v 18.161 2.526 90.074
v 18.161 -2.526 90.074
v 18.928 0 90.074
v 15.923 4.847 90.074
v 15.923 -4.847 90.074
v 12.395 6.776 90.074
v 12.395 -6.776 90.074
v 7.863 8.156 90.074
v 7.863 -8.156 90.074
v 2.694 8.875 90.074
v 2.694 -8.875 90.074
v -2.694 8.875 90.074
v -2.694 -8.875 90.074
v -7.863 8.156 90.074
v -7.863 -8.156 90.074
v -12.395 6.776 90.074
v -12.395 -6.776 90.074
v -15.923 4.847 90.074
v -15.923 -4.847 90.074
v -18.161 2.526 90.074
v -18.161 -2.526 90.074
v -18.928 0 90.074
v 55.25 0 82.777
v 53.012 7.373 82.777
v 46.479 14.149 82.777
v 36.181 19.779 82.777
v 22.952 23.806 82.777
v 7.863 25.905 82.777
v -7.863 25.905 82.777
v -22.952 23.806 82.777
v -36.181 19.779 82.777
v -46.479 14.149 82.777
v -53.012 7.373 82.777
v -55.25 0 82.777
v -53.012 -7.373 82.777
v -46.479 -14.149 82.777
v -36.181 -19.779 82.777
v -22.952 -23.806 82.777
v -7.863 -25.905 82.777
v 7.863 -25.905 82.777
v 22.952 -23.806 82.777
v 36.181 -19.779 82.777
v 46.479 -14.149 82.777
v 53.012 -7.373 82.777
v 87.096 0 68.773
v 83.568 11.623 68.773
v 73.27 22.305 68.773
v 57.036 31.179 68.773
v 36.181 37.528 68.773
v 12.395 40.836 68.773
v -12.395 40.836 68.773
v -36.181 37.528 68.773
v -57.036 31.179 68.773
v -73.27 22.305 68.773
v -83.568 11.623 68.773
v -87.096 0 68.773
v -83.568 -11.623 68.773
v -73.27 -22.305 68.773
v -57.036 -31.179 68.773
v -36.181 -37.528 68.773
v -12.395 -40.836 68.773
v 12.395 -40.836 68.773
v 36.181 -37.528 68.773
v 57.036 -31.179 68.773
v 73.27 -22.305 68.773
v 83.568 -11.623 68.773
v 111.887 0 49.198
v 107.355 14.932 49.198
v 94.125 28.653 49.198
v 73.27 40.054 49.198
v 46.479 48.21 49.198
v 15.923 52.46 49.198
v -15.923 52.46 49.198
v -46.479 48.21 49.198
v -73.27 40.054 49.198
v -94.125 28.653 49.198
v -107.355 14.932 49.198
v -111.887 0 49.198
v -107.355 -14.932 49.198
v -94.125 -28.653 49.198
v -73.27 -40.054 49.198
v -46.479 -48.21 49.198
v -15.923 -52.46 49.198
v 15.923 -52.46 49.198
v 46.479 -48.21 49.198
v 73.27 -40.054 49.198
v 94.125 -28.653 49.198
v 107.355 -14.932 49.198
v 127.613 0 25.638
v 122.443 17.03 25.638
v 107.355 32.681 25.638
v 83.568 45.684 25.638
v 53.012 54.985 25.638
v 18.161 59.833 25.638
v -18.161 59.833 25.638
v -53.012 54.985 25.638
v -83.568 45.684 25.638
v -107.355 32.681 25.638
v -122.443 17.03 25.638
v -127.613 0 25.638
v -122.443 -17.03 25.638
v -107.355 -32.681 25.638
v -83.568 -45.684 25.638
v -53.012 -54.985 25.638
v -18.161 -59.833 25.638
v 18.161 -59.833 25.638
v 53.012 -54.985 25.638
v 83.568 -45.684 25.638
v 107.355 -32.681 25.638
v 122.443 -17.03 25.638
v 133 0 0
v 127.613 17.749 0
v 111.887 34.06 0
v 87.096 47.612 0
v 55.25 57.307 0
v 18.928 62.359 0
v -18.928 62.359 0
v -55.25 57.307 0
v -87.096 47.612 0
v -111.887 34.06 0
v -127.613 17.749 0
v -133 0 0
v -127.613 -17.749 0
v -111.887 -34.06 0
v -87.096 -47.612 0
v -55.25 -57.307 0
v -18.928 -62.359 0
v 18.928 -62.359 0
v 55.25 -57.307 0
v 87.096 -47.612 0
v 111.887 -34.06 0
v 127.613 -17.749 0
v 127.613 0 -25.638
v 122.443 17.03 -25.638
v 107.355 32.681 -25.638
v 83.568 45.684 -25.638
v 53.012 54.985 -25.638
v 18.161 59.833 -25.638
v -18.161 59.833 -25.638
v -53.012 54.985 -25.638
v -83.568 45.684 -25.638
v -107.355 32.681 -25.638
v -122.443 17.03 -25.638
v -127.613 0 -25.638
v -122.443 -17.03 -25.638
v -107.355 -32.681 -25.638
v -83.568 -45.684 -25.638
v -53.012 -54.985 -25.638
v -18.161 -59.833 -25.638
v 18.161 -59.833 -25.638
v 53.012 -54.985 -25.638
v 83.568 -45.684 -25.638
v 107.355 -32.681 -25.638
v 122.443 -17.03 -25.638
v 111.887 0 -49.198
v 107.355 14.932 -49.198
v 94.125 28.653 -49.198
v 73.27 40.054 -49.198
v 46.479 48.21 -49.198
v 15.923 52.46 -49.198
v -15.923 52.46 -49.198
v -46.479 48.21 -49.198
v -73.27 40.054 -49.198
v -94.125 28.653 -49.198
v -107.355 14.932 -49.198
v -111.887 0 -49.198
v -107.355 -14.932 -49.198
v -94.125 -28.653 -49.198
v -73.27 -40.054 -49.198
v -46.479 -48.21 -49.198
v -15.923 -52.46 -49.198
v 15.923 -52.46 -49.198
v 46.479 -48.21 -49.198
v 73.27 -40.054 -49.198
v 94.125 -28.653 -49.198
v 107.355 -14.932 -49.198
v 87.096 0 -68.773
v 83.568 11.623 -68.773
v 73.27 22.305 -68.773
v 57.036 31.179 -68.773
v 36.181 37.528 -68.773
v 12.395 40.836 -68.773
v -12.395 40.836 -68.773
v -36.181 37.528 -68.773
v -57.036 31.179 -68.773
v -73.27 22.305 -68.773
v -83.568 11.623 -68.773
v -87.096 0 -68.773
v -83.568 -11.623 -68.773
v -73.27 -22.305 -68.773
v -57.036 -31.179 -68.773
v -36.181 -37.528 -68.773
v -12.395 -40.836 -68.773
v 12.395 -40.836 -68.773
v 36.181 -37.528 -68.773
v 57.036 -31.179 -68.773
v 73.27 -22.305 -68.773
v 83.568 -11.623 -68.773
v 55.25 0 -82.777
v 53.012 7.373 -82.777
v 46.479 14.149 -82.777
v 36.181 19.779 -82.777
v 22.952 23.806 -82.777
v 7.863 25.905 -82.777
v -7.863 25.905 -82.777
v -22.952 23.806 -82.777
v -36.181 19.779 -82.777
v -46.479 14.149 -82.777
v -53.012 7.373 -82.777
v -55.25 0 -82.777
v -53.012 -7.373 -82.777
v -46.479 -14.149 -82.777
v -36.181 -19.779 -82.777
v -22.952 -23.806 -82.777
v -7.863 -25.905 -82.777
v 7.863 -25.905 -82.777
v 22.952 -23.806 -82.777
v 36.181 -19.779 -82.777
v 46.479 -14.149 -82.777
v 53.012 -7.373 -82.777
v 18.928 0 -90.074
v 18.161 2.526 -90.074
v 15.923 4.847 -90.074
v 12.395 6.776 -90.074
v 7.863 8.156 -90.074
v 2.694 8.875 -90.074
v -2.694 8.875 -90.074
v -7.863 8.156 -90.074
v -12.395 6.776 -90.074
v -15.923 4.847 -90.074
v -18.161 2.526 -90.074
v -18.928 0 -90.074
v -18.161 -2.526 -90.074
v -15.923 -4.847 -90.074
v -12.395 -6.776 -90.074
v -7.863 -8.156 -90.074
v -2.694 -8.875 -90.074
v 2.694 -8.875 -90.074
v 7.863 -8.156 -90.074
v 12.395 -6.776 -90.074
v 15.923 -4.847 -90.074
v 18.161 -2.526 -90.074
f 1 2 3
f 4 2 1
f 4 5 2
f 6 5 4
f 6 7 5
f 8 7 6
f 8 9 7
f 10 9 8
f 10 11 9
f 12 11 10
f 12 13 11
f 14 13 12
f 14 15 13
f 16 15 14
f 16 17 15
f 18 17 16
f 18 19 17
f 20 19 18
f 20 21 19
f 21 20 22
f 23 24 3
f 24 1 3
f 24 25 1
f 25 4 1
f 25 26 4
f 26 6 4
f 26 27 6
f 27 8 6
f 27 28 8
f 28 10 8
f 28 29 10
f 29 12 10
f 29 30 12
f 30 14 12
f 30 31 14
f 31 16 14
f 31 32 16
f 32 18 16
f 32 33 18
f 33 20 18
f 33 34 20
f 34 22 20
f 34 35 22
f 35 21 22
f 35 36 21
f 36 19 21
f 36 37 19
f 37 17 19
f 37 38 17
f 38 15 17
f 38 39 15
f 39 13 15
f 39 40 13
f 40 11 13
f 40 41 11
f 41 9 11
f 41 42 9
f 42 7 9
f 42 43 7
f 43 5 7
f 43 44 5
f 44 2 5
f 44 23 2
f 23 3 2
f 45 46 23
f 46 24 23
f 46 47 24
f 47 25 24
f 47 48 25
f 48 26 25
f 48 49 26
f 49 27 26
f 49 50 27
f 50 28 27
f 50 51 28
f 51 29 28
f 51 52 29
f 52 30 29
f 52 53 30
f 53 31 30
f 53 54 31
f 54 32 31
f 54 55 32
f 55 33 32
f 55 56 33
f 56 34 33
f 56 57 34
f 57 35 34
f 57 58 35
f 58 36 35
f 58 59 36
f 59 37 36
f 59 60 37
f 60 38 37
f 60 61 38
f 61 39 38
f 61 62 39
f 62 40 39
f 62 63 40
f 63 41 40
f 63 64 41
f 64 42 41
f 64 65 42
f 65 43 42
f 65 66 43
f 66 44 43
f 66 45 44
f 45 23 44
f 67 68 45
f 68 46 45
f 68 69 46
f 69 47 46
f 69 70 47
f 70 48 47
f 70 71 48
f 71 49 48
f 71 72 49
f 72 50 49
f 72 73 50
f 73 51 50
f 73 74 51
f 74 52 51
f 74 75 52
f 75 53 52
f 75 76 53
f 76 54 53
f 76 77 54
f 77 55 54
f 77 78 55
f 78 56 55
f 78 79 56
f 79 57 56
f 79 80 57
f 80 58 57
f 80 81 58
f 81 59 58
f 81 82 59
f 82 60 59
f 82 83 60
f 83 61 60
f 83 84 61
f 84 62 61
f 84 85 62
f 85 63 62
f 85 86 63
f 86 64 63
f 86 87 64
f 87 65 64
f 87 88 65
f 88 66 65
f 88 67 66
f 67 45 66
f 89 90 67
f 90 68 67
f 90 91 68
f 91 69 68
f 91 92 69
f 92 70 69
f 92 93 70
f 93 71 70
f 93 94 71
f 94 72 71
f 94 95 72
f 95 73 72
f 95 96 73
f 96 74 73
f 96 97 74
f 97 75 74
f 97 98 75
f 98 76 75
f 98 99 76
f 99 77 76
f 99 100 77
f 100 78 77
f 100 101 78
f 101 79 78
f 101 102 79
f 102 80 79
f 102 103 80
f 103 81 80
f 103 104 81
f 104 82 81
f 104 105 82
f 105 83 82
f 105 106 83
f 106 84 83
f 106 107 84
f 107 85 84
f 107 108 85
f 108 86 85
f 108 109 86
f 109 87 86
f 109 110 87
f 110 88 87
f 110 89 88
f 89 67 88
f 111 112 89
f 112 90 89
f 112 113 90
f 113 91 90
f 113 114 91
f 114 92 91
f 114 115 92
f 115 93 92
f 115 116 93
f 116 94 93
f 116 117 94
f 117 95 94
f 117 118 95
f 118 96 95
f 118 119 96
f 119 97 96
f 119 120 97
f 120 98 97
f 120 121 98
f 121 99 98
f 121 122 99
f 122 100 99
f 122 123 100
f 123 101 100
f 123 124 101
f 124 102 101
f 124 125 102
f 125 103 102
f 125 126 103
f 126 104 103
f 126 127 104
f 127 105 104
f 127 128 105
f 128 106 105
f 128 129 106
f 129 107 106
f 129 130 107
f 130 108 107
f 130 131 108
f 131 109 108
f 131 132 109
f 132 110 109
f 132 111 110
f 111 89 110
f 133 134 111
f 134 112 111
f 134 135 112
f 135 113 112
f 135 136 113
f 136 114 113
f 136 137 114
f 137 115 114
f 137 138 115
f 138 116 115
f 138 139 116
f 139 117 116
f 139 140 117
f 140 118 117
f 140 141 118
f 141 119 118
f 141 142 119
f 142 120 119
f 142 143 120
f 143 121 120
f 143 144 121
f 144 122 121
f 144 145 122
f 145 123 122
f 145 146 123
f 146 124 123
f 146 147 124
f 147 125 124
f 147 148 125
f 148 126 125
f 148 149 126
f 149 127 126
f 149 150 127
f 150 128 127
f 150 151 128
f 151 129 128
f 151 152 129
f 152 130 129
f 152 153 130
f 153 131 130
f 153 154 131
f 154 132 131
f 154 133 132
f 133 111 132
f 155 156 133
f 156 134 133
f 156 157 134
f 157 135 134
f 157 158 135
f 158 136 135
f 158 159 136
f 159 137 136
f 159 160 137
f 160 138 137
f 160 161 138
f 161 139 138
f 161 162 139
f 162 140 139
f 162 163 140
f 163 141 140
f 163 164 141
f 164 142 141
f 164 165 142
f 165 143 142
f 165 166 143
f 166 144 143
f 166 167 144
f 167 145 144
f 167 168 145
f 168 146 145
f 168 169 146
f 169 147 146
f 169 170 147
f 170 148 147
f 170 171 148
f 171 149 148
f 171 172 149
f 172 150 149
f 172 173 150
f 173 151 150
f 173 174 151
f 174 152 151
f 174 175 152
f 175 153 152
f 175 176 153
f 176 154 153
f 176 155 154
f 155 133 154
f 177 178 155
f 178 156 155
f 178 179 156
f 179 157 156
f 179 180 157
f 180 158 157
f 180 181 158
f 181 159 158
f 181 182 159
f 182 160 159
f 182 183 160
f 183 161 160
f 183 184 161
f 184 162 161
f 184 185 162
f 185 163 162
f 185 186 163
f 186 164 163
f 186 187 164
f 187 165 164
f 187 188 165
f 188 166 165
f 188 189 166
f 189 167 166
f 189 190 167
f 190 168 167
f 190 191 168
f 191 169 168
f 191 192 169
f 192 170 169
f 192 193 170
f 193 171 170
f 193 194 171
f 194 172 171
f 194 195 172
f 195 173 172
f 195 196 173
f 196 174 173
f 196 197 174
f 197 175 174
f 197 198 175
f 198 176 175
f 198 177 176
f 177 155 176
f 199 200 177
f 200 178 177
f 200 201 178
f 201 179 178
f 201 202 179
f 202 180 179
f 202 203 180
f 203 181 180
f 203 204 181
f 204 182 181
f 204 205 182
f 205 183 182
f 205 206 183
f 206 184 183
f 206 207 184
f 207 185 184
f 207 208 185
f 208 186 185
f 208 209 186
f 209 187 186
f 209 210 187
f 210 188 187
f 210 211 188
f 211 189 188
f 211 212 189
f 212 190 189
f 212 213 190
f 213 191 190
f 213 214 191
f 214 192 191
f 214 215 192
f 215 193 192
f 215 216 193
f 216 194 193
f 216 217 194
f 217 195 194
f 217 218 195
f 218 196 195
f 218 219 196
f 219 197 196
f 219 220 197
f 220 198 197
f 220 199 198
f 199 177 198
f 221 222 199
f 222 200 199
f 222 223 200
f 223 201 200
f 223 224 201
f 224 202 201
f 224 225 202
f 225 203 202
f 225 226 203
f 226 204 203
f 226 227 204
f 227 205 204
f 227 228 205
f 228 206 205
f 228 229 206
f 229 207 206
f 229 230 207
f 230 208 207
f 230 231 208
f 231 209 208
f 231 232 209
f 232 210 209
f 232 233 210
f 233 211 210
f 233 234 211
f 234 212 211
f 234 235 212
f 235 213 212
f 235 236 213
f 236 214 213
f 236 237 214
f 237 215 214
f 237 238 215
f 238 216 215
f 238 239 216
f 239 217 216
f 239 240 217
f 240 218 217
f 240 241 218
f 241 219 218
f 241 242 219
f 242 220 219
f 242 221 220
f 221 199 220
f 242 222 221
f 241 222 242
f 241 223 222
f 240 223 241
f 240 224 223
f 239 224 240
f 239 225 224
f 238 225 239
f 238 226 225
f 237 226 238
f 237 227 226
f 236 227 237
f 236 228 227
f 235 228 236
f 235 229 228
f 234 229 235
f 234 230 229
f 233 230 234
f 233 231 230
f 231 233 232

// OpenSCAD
// Generated by SolidPython 1.0.1 on 2020-07-29 00:46:54


scale(v = [19, 9, 13]) {
	sphere(r = 7);
}
/***********************************************
*********      SolidPython code:      **********
************************************************
 
# import packages: SolidPython
from solid import *
from solid.utils import *
from itertools import chain, combinations, permutations


class Resize:

    def __init__(self, scad_file):
        self.scad_file = scad_file
        #self.scad_file = import_scad(scad_file)
        # cone/cylinder param:
        self.r1 = 0
        self.r2 = 0
        self.h = 0
        # rectangular prism param:
        self.w = 0
        self.l = 0
        # ellipse param:
        self.r = 0

    # import OpenScad code (file name corresponds to shape)


    # classify shape + parameters
    def assign(self, param1, param2, param3):
        if self.scad_file == 'cone.scad':
            self.r1 = param1
            self.r2 = param2
            self.h = param3
        elif self.scad_file == 'cylinder.scad':
            self.r1 = param1
            self.r2 = param2
            self.h = param3
        elif self.scad_file == 'rectangularPrism.scad':
            self.h = param1
            self.l = param2
            self.w = param3
        else:
            self.r = param1
            self.h = param2

    # resize parameters
    def iterate(self):
        x = range(3, 20, 2)
        i = 1
        if self.scad_file == 'cone.scad':
            tempList = list(permutations(x, 2))
            for temp in tempList:
                param1 = temp[0]
                param2 = temp[1]
                filepath = 'produced_scad_files/' + 'cone' + str(param1) + '_' + str(param2) + '_' + '.scad'
                scad_render_to_file(cylinder(h=param1, r1=param2, r2=0), filepath)

        elif self.scad_file == 'cylinder.scad':
            tempList = list(permutations(x, 3))
            for temp in tempList:
                param1 = temp[0]
                param2 = temp[1]
                filepath = 'produced_scad_files/' + 'cylinder' + str(param1) + '_' + str(param2) + '_' + '.scad'
                scad_render_to_file(cylinder(h=param1, r1=param2, r2=param2), filepath)

        elif self.scad_file == 'rectangularPrism.scad':
            tempList = list(permutations(x, 3))
            for temp in tempList:
                param1 = temp[0]
                param2 = temp[1]
                param3 = temp[2]
                filepath = 'produced_scad_files/' + 'rectangularPrism' + str(param1) + '_' + str(param2) + '_' + str(
                    param3) + '.scad'
                scad_render_to_file(cube(size=(param1, param2, param3)), filepath)

        elif self.scad_file == 'ellipse.scad':
            tempList = list(permutations(x, 4))
            for temp in tempList:
                param1 = temp[0]
                param2 = temp[1]
                param3 = temp[2]
                param4 = temp[3]
                filepath = 'produced_scad_files/' + 'ellipse' + str(param1) + '_' + str(param2) + '_' + str(param3) + '_' + str(param4) + '.scad'
                scad_render_to_file(scale([param1, param2, param3])(sphere(r=param4)), filepath)

    def render_to_scadfile(self):
        scad_render_to_file(scad, 'example.scad') 
 
************************************************/
